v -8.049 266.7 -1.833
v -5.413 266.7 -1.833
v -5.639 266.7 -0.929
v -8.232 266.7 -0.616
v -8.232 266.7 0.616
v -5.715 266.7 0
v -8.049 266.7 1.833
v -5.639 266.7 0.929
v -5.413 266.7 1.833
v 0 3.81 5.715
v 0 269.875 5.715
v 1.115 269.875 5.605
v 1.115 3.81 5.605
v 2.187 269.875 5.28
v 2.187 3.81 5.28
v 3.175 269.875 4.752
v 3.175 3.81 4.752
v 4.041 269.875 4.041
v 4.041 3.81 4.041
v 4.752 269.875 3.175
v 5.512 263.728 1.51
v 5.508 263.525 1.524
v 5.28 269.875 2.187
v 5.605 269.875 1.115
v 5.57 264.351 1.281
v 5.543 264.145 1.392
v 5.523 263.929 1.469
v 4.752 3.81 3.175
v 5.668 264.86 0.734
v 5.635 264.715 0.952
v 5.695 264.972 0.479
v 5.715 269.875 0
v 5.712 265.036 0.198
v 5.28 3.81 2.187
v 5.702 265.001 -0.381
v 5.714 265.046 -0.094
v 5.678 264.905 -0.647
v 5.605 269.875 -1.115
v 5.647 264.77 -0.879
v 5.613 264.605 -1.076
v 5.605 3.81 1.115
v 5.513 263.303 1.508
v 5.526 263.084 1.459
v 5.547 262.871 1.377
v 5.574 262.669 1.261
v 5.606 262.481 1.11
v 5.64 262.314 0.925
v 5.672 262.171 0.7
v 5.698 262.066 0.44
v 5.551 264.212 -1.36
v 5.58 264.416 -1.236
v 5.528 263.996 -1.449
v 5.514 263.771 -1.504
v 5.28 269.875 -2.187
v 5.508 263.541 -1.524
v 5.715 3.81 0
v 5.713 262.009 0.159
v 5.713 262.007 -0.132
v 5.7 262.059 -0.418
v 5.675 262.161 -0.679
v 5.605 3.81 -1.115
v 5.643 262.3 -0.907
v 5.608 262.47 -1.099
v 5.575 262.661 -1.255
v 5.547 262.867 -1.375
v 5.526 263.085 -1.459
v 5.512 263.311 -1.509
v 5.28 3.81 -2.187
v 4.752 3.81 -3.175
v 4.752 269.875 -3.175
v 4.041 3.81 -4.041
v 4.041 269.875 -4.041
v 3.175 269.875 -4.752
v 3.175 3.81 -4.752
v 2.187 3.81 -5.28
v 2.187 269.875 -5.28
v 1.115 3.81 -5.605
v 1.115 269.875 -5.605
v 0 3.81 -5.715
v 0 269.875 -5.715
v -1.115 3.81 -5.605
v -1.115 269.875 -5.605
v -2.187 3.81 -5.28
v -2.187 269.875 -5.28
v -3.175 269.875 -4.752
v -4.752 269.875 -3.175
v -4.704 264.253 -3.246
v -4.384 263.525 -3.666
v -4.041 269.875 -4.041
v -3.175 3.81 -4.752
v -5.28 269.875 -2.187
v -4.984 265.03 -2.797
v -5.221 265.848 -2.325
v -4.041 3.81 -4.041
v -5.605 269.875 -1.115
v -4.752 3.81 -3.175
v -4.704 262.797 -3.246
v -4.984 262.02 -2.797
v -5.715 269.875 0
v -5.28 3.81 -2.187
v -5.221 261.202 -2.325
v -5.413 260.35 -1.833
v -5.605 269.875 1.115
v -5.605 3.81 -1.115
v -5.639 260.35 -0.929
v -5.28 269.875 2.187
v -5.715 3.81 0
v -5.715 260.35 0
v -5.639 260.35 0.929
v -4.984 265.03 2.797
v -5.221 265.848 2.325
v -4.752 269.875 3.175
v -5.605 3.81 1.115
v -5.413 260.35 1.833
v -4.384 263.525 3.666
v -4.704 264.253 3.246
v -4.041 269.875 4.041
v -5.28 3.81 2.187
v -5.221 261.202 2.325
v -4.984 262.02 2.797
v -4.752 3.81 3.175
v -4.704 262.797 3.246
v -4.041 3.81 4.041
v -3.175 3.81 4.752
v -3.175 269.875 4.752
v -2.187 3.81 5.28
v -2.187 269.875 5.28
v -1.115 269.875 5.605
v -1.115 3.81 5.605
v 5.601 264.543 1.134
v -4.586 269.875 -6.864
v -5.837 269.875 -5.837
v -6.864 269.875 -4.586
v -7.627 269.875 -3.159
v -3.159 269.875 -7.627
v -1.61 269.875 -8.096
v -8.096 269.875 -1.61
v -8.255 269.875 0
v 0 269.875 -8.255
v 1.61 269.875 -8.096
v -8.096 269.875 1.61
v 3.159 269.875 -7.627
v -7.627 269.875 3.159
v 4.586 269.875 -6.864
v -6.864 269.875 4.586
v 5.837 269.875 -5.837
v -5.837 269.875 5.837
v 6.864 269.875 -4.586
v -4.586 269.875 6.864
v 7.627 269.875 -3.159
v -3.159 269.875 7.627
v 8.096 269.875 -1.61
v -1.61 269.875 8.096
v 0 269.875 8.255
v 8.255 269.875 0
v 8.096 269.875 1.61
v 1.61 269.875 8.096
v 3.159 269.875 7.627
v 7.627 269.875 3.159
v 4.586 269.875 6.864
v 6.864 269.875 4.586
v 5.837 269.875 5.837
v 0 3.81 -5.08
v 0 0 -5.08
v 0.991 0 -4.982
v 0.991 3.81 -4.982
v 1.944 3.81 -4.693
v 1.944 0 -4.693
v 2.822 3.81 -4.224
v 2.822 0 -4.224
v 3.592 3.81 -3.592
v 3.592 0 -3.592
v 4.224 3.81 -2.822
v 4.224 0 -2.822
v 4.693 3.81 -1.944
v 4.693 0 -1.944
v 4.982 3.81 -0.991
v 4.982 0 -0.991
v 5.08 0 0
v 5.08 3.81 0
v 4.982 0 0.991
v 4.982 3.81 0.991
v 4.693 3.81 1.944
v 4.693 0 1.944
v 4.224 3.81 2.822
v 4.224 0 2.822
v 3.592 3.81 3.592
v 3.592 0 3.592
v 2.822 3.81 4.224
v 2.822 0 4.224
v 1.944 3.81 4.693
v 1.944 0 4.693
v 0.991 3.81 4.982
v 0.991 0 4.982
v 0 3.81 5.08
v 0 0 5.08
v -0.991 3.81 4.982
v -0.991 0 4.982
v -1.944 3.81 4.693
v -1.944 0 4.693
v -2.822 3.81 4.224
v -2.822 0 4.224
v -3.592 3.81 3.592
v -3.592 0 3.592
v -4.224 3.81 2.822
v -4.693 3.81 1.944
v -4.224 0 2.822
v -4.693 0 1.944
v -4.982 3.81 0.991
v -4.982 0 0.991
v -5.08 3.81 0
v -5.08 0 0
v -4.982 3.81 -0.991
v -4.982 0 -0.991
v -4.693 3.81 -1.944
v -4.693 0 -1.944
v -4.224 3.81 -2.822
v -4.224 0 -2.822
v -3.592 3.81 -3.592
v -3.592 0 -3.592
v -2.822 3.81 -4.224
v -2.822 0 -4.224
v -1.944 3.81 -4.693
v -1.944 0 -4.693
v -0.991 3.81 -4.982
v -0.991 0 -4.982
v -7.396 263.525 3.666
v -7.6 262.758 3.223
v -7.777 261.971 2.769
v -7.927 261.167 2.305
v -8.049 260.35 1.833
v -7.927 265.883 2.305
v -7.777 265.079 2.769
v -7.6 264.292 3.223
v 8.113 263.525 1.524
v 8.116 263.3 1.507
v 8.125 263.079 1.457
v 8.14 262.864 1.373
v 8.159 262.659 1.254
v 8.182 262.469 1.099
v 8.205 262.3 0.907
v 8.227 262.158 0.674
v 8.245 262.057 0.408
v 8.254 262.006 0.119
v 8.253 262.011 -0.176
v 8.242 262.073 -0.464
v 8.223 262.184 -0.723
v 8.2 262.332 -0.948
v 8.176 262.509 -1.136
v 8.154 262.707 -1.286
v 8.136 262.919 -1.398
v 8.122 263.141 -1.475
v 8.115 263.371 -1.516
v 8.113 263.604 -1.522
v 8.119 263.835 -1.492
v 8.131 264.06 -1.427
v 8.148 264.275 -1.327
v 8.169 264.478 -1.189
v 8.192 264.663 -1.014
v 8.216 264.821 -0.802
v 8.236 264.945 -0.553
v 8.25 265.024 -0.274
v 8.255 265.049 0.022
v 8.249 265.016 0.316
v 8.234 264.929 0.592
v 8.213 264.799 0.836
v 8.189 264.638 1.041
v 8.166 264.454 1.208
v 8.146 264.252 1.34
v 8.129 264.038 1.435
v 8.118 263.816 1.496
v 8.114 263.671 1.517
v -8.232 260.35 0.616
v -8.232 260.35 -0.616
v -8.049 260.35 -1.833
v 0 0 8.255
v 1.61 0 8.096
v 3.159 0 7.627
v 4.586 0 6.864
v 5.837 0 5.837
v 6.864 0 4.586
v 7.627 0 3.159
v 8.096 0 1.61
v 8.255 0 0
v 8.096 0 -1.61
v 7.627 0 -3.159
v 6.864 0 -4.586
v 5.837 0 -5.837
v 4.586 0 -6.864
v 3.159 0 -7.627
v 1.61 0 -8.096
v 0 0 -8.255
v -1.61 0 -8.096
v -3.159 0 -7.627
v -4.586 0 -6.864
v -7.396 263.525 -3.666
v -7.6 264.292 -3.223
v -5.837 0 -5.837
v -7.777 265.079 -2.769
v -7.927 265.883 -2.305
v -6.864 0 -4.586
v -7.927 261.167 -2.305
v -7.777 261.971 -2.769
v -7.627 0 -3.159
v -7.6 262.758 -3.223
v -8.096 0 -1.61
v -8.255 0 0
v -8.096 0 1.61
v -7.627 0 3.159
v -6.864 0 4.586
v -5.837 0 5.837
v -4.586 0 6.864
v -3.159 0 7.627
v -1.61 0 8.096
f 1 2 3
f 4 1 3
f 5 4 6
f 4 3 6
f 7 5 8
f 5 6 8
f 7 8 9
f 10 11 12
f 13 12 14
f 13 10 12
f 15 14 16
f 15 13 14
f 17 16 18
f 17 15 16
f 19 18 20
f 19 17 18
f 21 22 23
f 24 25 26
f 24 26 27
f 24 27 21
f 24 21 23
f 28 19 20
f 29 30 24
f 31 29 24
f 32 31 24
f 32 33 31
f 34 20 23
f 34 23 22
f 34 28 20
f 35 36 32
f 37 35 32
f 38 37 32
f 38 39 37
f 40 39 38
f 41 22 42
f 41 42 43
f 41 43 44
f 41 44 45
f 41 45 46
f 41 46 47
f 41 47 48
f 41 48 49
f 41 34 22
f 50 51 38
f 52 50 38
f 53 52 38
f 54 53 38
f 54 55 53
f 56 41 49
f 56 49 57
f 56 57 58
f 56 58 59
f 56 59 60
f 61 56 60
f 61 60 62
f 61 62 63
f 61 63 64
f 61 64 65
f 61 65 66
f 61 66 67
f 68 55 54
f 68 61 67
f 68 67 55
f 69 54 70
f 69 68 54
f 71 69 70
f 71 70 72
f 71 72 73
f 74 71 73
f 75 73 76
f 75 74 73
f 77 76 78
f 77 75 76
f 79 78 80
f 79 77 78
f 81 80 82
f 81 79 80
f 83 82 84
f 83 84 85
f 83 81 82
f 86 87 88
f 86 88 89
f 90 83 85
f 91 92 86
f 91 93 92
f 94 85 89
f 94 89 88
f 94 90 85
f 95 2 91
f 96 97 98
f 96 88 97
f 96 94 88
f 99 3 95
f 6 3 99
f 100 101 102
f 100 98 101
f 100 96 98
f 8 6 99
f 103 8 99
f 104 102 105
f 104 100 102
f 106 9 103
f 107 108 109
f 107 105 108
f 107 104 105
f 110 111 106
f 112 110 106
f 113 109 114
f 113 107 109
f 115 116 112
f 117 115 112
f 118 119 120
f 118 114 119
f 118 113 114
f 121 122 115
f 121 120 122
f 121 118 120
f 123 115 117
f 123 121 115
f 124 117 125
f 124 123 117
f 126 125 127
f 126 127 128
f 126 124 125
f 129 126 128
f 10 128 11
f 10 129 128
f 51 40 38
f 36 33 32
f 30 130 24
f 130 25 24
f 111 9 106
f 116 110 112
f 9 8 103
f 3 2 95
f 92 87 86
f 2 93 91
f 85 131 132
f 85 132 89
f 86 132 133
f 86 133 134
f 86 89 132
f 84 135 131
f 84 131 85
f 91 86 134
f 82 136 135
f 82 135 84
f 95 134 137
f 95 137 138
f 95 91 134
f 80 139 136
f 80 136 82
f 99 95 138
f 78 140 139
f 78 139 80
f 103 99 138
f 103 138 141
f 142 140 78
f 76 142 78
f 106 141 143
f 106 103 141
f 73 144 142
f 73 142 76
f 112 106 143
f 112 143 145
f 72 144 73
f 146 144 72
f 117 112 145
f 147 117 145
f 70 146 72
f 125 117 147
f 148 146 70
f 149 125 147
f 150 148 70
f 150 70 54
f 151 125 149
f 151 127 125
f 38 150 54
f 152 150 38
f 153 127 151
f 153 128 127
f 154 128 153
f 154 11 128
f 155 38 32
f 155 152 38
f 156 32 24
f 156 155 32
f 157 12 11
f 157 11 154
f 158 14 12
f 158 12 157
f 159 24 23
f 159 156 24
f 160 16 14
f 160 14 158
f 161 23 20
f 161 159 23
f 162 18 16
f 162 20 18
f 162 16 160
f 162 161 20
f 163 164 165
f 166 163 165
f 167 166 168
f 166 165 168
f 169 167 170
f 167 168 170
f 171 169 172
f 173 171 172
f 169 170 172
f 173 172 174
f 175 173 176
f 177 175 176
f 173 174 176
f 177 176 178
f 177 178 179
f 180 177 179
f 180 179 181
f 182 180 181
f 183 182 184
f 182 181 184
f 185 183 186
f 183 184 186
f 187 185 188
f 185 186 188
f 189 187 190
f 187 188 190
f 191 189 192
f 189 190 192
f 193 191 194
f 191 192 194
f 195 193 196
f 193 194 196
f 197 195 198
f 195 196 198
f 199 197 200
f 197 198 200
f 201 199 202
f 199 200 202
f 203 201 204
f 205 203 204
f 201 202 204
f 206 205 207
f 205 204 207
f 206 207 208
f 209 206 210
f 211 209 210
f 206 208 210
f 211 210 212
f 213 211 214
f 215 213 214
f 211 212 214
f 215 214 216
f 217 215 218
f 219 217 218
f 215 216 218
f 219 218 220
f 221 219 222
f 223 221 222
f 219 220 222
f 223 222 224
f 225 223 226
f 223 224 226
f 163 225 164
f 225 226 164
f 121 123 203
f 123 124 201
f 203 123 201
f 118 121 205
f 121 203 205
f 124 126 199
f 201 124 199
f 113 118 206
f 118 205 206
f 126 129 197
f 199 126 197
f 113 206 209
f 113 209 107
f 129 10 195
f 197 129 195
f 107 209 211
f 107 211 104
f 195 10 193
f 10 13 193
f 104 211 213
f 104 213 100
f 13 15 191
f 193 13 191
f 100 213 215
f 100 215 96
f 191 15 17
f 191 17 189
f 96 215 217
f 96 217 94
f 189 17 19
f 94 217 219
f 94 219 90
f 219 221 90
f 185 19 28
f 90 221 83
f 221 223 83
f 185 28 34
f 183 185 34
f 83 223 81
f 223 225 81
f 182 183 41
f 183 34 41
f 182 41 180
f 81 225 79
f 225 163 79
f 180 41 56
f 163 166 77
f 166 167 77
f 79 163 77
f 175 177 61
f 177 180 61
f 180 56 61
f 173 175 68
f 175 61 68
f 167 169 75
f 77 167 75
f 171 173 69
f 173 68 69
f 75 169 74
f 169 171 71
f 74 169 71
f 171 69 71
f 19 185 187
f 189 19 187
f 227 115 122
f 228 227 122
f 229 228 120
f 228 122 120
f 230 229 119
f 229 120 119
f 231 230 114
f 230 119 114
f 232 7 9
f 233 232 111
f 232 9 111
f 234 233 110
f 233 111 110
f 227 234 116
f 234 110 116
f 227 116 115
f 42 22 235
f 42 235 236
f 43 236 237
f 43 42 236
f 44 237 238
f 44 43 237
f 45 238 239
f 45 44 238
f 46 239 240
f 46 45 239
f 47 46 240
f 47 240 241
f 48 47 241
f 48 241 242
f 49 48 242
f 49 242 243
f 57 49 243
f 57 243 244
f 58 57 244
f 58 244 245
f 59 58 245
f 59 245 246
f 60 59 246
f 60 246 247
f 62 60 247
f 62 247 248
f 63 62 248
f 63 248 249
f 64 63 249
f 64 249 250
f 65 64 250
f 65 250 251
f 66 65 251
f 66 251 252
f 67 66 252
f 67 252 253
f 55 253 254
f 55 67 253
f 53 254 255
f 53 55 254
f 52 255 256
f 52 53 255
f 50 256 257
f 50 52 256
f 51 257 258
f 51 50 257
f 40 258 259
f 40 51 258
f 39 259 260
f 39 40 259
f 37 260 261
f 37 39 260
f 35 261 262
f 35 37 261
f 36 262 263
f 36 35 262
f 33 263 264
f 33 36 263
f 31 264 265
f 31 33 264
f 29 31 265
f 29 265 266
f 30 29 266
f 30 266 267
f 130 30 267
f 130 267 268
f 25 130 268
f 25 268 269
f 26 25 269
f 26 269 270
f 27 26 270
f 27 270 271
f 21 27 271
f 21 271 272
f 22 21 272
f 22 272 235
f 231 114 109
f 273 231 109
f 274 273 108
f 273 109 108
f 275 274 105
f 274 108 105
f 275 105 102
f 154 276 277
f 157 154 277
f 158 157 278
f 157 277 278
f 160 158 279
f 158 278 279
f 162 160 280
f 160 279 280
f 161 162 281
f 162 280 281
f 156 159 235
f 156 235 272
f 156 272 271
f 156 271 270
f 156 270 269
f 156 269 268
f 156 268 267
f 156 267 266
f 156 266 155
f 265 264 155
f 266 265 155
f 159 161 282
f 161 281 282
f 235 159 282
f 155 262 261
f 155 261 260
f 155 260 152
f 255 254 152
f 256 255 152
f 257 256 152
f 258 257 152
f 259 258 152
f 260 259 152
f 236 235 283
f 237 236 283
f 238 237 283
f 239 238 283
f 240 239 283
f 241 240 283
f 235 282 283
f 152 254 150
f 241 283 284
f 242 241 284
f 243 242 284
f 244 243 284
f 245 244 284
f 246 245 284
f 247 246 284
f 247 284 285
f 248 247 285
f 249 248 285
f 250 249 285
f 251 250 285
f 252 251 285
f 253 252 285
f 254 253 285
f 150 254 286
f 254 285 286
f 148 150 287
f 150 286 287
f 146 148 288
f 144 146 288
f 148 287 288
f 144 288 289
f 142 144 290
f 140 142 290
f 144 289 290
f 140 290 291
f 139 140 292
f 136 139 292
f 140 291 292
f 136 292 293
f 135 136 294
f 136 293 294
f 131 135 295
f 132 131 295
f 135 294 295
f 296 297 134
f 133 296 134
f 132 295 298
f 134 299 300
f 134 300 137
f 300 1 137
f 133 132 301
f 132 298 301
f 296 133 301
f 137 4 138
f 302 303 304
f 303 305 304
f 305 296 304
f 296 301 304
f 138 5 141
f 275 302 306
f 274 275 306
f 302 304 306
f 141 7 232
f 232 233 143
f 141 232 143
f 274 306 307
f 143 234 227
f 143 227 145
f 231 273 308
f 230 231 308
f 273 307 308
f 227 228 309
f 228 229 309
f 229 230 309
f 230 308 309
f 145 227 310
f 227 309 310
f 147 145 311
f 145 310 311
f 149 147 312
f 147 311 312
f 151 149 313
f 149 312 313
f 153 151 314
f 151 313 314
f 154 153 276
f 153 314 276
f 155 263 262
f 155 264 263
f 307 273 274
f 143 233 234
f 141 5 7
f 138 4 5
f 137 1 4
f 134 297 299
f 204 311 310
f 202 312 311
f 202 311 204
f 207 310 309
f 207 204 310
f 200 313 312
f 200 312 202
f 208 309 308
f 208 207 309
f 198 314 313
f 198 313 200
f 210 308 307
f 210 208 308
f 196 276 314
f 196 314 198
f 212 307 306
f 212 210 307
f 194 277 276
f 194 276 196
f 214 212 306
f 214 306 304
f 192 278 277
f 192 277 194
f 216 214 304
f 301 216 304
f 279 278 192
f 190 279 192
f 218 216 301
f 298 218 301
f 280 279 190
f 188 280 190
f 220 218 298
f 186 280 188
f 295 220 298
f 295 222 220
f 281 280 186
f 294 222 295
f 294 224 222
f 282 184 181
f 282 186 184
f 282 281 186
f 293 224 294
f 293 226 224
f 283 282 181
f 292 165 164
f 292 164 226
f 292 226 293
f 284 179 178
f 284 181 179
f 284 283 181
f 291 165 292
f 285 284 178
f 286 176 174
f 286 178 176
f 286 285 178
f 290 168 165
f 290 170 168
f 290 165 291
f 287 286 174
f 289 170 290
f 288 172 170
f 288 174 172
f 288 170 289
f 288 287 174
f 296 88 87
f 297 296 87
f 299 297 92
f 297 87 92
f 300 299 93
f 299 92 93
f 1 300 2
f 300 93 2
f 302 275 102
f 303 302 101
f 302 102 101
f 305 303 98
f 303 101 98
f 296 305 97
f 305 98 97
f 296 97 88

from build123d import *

# Parameters (mm, degrees)
SKETCH1_R           = 8.255
SKETCH1_R_2         = 5.715
BOSS_EXTRUDE1_DEPTH = 269.875
CUT_EXTRUDE1_DEPTH  = 271.127387865
SKETCH3_R           = 1.524
CUT_EXTRUDE2_DEPTH  = 271.127387865
SKETCH4_R           = 5.715
SKETCH4_R_2         = 5.08
BOSS_EXTRUDE2_DEPTH = 3.81


with BuildPart() as part:
    # Sketch1 → Boss-Extrude1 (new body)
    with BuildSketch(Plane(origin=(0, 0, 0), x_dir=(1, 0, 0), z_dir=(0, 1, 0))):
        with Locations(Location((0, 0, 0), (0, 0, 270))):
            Circle(SKETCH1_R)
        with Locations(Location((0, 0, 0), (0, 0, 270))):
            Circle(SKETCH1_R_2, mode=Mode.SUBTRACT)
    extrude(amount=BOSS_EXTRUDE1_DEPTH)

    # Sketch2 → Cut-Extrude1 (cut, through all)
    with BuildSketch(Plane(origin=(0, 0, 0), x_dir=(0, 0, -1), z_dir=(1, 0, 0))):
        Polygon((1.833087105, 260.35), (3.666174209, 263.525), (1.833087105, 266.7), (-1.833087105, 266.7), (-3.666174209, 263.525), (-1.833087105, 260.35), align=None)
    extrude(amount=-CUT_EXTRUDE1_DEPTH, mode=Mode.SUBTRACT)

    # Sketch3 → Cut-Extrude2 (cut, through all)
    with BuildSketch(Plane(origin=(0, 0, 0), x_dir=(0, 0, -1), z_dir=(1, 0, 0))):
        with Locations(Location((0, 263.525, 0), (0, 0, 180))):
            Circle(SKETCH3_R)
    extrude(amount=CUT_EXTRUDE2_DEPTH, mode=Mode.SUBTRACT)

    # Sketch4 → Boss-Extrude2 (add)
    with BuildSketch(Plane.XZ):
        with Locations(Location((0, 0, 0), (0, 0, 270))):
            Circle(SKETCH4_R)
        with Locations(Location((0, 0, 0), (0, 0, 270))):
            Circle(SKETCH4_R_2, mode=Mode.SUBTRACT)
    extrude(amount=-BOSS_EXTRUDE2_DEPTH)


solid = part.part
